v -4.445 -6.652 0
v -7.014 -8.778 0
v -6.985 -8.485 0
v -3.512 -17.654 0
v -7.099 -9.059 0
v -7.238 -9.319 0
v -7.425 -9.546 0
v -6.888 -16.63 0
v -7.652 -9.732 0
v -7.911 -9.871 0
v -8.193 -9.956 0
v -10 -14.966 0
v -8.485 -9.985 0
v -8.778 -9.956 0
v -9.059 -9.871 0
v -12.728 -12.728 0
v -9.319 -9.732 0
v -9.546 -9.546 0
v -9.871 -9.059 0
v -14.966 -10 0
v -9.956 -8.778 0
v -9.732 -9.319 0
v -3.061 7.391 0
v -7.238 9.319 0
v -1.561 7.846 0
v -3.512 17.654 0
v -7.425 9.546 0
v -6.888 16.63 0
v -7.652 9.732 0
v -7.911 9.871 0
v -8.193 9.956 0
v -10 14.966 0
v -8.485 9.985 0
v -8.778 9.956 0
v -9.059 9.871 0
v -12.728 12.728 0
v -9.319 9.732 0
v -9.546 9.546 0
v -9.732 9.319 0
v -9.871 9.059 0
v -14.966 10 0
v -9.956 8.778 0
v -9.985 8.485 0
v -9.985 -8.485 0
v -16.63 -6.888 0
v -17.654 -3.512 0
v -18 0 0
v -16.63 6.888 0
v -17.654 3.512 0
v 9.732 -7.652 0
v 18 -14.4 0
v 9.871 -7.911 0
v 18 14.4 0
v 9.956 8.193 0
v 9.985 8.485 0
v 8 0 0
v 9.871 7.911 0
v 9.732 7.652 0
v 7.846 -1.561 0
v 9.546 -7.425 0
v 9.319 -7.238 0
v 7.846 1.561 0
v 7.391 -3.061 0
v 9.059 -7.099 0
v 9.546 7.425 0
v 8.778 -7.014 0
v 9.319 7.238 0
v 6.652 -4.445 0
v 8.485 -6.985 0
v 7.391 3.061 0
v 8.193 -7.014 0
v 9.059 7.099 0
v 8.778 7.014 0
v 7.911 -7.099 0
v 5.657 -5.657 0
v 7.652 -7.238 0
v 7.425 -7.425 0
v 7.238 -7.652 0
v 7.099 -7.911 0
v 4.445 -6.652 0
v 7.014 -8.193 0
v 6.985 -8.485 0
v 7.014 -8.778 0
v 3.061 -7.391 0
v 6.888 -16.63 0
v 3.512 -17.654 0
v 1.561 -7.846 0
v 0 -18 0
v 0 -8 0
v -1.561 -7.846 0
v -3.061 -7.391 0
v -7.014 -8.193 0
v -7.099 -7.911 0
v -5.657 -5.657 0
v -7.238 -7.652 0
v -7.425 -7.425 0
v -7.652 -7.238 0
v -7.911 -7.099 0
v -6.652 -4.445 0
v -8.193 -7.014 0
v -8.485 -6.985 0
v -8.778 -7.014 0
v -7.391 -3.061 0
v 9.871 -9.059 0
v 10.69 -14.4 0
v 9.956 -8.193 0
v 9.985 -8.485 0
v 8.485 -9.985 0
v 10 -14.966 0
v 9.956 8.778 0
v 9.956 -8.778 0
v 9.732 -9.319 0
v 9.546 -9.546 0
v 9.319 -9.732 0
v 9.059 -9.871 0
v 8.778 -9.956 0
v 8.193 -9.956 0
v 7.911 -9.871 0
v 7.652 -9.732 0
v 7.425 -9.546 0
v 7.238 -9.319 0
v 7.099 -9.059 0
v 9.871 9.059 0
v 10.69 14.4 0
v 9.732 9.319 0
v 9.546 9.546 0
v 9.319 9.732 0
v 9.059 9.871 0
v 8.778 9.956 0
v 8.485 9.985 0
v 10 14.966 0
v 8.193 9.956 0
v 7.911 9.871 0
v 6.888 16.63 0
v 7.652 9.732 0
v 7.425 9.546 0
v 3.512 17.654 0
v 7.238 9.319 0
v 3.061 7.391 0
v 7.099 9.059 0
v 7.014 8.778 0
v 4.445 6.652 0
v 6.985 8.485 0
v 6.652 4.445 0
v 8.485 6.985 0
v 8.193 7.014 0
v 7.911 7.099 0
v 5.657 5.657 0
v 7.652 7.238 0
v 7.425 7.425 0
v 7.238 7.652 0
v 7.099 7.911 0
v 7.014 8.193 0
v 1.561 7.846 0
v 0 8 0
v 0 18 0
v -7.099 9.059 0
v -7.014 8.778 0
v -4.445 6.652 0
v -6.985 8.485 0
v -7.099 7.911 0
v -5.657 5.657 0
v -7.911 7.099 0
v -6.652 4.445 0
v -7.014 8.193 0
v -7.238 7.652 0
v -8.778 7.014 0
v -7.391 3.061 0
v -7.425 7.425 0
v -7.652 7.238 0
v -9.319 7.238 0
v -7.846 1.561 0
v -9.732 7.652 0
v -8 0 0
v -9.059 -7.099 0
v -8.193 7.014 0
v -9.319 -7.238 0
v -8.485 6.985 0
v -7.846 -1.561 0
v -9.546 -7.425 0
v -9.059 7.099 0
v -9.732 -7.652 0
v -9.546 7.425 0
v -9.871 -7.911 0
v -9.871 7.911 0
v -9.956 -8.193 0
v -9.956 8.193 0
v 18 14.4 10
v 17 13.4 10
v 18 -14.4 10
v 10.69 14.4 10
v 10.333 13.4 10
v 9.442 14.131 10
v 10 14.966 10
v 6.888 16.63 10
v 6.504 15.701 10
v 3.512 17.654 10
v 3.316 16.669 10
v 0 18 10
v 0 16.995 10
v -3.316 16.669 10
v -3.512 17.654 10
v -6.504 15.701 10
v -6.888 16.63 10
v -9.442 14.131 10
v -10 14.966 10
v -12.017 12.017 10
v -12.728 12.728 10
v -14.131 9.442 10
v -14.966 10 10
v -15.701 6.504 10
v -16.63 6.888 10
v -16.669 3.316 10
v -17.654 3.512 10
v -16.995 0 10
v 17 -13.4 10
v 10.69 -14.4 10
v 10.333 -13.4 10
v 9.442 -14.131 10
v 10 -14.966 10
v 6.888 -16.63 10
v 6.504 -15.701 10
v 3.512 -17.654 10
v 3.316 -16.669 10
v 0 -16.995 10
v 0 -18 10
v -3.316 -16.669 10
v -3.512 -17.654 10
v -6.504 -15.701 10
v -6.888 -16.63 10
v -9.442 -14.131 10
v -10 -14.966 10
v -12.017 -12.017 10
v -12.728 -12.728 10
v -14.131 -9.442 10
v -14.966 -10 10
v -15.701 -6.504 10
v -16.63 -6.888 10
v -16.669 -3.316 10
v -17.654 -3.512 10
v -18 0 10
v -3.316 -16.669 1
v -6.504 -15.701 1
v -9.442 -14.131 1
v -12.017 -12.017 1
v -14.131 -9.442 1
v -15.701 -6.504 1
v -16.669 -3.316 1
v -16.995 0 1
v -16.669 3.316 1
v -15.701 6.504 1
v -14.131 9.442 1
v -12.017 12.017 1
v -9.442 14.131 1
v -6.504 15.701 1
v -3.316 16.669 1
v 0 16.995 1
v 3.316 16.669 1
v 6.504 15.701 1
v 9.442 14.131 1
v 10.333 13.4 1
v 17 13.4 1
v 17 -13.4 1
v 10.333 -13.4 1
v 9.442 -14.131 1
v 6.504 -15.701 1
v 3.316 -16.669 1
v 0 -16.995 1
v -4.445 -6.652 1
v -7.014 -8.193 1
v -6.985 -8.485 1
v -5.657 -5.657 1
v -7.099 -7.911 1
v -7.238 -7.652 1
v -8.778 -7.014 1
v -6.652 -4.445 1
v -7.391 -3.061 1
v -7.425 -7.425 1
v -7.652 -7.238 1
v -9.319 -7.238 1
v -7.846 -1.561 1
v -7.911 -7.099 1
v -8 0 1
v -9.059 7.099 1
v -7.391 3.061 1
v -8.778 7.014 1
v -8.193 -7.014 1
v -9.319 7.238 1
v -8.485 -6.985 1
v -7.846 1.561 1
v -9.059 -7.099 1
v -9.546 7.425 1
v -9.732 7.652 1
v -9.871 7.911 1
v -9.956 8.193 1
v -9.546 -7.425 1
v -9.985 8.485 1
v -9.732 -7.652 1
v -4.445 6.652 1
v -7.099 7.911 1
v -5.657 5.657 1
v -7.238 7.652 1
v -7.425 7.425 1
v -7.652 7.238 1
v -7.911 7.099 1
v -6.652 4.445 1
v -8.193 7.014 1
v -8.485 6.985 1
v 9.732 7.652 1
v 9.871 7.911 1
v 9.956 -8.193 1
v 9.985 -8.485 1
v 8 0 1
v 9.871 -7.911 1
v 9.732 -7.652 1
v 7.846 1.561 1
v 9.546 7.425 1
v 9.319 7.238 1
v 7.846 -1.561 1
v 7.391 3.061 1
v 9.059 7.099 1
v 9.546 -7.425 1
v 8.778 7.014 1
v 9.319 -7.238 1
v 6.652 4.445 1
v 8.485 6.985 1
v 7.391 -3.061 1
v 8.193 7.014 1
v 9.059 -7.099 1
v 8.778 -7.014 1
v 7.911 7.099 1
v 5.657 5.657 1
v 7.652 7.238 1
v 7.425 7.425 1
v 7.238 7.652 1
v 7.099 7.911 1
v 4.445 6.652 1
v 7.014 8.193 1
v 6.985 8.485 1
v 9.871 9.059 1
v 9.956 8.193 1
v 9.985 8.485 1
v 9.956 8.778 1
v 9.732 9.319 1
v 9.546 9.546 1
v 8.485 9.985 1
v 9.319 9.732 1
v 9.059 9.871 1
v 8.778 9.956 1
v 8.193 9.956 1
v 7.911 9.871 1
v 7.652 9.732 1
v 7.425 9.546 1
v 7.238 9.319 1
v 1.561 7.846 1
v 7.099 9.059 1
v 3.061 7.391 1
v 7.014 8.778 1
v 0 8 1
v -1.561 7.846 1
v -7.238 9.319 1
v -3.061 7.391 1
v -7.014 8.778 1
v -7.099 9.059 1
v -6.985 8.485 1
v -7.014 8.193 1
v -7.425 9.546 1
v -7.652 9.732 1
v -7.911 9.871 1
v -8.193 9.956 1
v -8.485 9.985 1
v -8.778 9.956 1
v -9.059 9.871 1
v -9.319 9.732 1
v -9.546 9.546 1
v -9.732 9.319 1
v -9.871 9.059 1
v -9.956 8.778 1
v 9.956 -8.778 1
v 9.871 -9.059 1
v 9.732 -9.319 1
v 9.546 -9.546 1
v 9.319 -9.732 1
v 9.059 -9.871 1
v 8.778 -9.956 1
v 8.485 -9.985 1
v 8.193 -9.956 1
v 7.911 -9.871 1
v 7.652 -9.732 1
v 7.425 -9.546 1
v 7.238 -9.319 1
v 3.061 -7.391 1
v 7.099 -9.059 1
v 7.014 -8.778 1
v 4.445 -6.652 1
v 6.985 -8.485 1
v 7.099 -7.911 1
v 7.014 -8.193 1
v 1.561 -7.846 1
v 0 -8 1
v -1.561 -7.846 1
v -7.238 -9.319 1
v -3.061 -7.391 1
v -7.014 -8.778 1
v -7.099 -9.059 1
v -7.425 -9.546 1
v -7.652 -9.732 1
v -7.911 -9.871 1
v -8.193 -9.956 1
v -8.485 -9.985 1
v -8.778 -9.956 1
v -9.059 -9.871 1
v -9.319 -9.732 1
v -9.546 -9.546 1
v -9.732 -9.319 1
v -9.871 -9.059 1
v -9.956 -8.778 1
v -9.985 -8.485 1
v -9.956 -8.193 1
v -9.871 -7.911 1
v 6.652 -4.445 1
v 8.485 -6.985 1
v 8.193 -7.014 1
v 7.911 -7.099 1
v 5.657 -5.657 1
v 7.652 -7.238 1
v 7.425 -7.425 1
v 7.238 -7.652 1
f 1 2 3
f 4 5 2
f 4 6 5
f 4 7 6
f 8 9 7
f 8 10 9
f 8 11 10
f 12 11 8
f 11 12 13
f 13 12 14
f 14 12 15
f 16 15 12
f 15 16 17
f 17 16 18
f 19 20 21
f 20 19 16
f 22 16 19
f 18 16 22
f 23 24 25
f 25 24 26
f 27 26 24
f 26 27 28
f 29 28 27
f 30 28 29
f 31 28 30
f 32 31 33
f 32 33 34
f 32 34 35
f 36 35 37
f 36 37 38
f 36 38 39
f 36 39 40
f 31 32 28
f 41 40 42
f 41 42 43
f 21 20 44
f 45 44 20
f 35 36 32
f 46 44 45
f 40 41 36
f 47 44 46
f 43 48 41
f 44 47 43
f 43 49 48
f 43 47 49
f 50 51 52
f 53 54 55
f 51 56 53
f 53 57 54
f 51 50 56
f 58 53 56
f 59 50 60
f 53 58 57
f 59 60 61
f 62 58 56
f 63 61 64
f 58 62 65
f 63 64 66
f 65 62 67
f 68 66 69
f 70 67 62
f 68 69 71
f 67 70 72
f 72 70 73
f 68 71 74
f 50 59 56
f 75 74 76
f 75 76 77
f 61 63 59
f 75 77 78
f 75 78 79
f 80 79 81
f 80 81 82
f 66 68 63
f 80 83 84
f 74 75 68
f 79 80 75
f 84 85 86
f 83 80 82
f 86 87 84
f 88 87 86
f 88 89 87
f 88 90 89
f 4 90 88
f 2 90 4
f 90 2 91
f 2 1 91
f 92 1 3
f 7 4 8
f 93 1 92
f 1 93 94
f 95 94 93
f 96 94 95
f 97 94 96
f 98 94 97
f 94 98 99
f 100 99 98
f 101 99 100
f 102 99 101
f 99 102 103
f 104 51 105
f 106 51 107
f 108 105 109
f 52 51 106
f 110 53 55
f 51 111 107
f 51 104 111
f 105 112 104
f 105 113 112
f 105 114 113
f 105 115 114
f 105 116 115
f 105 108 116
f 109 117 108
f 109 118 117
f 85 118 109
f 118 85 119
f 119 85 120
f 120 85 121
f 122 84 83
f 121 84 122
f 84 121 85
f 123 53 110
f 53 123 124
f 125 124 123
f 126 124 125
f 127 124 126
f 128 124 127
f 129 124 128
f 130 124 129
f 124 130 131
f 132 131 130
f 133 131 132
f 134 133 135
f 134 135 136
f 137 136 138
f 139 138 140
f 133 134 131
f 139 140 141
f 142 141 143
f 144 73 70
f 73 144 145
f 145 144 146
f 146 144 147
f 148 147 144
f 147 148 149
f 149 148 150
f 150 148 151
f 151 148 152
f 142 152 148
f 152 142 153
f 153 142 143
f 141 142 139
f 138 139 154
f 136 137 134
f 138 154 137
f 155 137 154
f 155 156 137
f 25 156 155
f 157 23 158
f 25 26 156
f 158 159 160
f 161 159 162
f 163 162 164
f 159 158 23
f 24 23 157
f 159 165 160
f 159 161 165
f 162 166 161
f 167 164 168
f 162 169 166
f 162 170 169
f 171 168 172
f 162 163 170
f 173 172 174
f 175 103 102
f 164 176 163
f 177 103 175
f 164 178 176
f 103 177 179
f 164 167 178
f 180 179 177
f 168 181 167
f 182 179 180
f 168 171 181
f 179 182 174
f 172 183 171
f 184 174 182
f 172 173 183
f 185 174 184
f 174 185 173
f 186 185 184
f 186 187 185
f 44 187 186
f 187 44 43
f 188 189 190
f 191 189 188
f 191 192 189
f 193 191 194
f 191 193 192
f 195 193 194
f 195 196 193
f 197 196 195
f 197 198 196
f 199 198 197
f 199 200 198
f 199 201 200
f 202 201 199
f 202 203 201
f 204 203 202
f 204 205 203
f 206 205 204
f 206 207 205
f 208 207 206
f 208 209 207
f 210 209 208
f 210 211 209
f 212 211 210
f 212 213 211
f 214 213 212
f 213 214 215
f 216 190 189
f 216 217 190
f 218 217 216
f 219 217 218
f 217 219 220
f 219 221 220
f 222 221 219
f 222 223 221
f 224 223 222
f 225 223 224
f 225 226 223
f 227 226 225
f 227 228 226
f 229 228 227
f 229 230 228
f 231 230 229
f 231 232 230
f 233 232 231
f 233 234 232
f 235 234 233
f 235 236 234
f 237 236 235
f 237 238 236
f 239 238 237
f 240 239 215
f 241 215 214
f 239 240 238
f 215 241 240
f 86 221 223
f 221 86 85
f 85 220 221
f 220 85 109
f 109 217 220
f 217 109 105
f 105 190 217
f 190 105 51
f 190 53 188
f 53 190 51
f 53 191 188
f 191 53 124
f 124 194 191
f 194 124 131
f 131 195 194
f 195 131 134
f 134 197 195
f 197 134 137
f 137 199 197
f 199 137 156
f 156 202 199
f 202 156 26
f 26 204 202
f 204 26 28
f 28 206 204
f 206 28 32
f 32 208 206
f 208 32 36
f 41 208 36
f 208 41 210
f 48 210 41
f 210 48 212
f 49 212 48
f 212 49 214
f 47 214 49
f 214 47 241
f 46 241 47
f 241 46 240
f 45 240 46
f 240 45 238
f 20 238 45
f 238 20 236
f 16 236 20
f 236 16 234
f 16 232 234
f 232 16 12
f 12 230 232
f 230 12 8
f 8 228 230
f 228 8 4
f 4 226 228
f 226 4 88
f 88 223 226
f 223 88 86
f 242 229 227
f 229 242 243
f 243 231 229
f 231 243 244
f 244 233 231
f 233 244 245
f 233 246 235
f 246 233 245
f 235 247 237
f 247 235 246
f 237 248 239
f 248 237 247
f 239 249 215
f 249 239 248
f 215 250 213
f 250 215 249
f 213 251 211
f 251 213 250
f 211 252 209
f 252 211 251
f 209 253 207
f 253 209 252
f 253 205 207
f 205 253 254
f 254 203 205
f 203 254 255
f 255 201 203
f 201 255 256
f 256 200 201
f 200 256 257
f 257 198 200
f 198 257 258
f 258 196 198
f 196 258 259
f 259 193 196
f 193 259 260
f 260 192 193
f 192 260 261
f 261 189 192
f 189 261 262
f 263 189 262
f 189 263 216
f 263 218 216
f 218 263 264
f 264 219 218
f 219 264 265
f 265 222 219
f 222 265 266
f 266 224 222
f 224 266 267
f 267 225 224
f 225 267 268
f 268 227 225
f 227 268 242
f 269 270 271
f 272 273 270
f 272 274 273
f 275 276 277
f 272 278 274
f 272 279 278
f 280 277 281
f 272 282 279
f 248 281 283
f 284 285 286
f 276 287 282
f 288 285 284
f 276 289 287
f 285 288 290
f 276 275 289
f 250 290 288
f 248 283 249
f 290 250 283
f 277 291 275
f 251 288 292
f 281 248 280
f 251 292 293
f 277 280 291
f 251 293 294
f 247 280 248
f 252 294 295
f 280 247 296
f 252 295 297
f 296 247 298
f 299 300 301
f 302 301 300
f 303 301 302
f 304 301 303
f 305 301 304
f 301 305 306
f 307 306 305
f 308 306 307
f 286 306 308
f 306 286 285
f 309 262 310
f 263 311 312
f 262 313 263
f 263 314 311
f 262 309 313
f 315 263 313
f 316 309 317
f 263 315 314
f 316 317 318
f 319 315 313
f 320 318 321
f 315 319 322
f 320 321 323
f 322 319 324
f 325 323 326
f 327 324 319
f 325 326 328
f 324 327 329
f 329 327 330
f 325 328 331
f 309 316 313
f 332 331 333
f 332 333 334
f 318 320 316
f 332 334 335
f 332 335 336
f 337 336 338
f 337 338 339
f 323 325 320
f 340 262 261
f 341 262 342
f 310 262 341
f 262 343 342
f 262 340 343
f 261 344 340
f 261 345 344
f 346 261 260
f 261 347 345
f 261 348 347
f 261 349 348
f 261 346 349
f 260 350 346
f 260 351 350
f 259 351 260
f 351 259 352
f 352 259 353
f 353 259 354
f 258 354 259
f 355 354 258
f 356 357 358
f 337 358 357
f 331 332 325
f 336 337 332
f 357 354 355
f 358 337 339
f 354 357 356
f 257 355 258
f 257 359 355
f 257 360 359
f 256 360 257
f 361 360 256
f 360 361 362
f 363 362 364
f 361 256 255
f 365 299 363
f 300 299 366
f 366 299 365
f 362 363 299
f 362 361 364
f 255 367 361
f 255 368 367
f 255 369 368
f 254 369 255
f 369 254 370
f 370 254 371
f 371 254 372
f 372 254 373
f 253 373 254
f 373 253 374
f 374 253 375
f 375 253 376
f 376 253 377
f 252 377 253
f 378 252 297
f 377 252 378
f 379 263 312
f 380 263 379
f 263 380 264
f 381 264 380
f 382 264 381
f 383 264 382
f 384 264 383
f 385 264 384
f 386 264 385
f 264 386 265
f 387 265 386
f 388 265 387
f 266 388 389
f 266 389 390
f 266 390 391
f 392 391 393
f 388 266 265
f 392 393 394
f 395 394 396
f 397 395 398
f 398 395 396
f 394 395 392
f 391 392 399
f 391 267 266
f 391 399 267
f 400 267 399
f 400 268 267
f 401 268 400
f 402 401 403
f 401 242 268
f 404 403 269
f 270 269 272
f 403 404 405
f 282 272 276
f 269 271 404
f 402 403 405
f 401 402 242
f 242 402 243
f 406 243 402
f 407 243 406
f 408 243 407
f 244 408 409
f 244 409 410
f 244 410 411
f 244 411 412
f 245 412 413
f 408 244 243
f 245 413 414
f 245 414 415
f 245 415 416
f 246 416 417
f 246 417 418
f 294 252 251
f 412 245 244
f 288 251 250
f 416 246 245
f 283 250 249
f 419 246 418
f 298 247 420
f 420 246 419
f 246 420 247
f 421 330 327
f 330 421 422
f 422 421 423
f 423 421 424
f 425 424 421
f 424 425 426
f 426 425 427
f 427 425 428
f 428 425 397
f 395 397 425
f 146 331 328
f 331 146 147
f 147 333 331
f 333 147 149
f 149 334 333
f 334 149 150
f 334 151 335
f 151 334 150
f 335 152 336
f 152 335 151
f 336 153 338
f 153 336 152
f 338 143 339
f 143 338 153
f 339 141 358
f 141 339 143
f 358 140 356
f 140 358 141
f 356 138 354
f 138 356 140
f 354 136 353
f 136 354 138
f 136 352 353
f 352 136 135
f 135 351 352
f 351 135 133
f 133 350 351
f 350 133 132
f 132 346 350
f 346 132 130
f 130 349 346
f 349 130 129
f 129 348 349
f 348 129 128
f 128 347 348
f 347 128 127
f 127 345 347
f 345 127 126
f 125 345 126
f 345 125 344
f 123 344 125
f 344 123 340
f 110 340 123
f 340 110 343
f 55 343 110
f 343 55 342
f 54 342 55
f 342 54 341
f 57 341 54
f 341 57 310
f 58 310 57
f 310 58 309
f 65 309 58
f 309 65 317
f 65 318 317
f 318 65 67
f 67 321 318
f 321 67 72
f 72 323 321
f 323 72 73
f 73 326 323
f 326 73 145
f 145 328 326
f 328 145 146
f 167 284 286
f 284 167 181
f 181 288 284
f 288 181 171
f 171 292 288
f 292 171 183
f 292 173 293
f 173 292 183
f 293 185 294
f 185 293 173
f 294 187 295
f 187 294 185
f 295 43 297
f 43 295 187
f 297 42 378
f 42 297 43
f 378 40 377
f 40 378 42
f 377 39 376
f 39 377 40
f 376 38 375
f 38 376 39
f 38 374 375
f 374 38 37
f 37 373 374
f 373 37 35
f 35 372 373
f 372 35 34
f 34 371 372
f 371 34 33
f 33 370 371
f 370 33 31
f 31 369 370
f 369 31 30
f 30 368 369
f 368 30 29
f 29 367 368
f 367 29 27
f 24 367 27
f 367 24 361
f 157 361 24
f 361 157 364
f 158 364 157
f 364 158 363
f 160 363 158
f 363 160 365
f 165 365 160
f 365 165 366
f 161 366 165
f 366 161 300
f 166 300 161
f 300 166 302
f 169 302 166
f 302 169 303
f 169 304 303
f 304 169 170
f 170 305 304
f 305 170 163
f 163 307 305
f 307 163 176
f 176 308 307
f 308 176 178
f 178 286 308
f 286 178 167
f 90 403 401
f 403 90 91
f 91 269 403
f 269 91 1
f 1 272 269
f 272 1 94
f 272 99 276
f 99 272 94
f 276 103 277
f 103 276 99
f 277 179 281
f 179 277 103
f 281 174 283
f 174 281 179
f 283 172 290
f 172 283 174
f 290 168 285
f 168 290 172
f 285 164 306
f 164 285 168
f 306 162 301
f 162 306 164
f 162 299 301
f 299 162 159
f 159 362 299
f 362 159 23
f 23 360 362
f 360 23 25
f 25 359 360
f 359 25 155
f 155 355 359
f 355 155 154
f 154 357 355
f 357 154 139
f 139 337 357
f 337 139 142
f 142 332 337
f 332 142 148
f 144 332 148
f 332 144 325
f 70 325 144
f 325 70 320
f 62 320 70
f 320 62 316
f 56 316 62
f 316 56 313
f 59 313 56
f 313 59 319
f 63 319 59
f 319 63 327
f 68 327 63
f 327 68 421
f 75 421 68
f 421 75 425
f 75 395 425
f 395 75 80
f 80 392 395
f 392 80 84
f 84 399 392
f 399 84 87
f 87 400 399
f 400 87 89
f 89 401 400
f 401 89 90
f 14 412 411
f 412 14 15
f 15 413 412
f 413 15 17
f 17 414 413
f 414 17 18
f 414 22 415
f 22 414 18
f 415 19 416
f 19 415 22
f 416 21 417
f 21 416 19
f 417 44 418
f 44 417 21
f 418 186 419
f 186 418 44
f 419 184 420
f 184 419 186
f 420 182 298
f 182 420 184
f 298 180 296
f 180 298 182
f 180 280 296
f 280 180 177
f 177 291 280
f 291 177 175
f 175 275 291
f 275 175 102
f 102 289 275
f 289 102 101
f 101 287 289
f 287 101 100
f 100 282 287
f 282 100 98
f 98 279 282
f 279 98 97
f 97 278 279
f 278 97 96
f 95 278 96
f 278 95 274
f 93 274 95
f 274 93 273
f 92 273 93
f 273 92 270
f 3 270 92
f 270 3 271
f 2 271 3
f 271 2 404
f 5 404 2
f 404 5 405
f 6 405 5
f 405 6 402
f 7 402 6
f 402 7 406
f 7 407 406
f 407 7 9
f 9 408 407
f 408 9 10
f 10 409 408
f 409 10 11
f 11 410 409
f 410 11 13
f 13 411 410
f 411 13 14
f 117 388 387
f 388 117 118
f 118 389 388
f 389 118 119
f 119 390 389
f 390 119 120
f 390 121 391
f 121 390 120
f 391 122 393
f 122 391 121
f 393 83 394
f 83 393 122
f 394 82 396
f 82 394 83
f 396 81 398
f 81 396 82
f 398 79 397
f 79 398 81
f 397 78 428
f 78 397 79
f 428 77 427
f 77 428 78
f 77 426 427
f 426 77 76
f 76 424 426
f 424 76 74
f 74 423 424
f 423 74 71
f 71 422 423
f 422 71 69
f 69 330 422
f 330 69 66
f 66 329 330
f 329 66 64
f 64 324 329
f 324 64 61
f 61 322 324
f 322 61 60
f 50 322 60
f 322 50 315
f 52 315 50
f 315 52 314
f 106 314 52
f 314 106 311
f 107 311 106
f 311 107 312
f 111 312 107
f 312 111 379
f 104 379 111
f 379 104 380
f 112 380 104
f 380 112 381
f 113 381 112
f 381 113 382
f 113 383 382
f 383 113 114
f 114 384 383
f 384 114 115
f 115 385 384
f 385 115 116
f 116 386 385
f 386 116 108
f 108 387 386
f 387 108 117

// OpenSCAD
// file: oem/mr08d_024022_motor.scad
function vMR08D024022MotorDatasheet() =
     [["terminal_hole_diameter", 1.6], ["terminal_thickness", 0.45],
      ["terminal_length", 5.7], ["terminal_width", 3.75],
      ["length", 100.5], ["motor_diameter", 37], ["bottom_diameter", 36],
      ["airway_to_bottom", 16.7], ["shaft_hole_diameter", 3],
      ["shaft_hole_offset", 10.7], ["shaft_length", 28],
      ["shaft_diameter", 8], ["bearing_diameter", 16],
      ["gear_box_length", 42], ["gear_box_diameter", 34],
      ["mount_angles", [-135, -45, 45, 135]],
      ["mount_diameter", 24], ["mount_hole_diameter", 3]];

module mMR08D024022Motor() {
     rotate([-19, 0, 0]) {
          rotate([0, 90, 0]) {
               // TODO(hidmic): revisar!
               translate([0.02841282, 0, 28-144.04437256]) {
                    import("stl/MR08D-024022.stl");
               }
          }
     }
}

mMR08D024022Motor();
// main file
include <generic/lib.scad>;

use <oem/mr08d_024022_motor.scad>;

function vMR08DMotorFrontCapDatasheet() =
     let (motor_datasheet=vMR08D024022MotorDatasheet())
     [["main_diameter", property(motor_datasheet, "gear_box_diameter") + 2],
      ["main_height", 10], ["wall_thickness", 1]];


module mMR08DMotorFrontCap() {
     datasheet = vMR08DMotorFrontCapDatasheet();
     main_diameter = property(datasheet, "main_diameter");
     main_height = property(datasheet, "main_height");
     wall_thickness = property(datasheet, "wall_thickness");

     module front_view_section() {
          union() {
               translate([main_diameter / 4, 0]) {
                    square([main_diameter / 2, main_diameter * 0.8], center=true);
               }
               circle(d=main_diameter);
          }
     }
     linear_extrude(height=main_height) {
          outline(delta=-wall_thickness) {
               front_view_section();
          }
     }
     linear_extrude(height=wall_thickness) {
          difference() {
               front_view_section();
               let (motor_datasheet=vMR08D024022MotorDatasheet()) {
                    circle(d=property(motor_datasheet, "bearing_diameter"));
                    for(angle = property(motor_datasheet, "mount_angles")) {
                         rotate([0, 0, angle]) {
                              translate([property(motor_datasheet, "mount_diameter")/2, 0]) {
                                   circle(d=property(motor_datasheet, "mount_hole_diameter"));
                              }
                         }
                    }
               }
          }
     }
}

mMR08DMotorFrontCap();





module mMR08DMotorClampPartB() {
     for (v = [[-kDCMotorPlusGearBoxLength/2, kDCMotorDiameter-kEpsilon],
               [-kDCMotorPlusGearBoxLength, kDCMotorBottomDiameter-kEpsilon]]) {
          let(x_offset = v[0], cut_diameter = v[1]) {
               translate([x_offset, 0, 0]) {
                    rotate([0, -90, 0]) {
                         linear_extrude(height=kChassisThickness) {
                              difference() {
                                   duplicate([0, 1, 0]) {
                                        translate([0, -kDCMotorDiameter/2 , 0]) {
                                             rotate([0, 0,  -90]) {
                                                  exp_nerve_xsection(kBeltDriveMotorAxleHeight/2, kDCMotorDiameter/4, decay_rate = 4);
                                             }
                                             square([kBeltDriveMotorAxleHeight/2, kDCMotorDiameter/2]);
                                        }
                                   }
                                   translate([kBeltDriveMotorAxleHeight, 0]) circle(d=cut_diameter);
                              }
                         }
                    }
               }
          }
     }
     duplicate([0, 1, 0]) {
          translate([-kDCMotorPlusGearBoxLength, kDCMotorDiameter/4, 0]) {
               cube([kDCMotorPlusGearBoxLength/2, kChassisThickness, kChassisThickness]);
          }
     }
}

//mMR08DMotorClampPartB();
